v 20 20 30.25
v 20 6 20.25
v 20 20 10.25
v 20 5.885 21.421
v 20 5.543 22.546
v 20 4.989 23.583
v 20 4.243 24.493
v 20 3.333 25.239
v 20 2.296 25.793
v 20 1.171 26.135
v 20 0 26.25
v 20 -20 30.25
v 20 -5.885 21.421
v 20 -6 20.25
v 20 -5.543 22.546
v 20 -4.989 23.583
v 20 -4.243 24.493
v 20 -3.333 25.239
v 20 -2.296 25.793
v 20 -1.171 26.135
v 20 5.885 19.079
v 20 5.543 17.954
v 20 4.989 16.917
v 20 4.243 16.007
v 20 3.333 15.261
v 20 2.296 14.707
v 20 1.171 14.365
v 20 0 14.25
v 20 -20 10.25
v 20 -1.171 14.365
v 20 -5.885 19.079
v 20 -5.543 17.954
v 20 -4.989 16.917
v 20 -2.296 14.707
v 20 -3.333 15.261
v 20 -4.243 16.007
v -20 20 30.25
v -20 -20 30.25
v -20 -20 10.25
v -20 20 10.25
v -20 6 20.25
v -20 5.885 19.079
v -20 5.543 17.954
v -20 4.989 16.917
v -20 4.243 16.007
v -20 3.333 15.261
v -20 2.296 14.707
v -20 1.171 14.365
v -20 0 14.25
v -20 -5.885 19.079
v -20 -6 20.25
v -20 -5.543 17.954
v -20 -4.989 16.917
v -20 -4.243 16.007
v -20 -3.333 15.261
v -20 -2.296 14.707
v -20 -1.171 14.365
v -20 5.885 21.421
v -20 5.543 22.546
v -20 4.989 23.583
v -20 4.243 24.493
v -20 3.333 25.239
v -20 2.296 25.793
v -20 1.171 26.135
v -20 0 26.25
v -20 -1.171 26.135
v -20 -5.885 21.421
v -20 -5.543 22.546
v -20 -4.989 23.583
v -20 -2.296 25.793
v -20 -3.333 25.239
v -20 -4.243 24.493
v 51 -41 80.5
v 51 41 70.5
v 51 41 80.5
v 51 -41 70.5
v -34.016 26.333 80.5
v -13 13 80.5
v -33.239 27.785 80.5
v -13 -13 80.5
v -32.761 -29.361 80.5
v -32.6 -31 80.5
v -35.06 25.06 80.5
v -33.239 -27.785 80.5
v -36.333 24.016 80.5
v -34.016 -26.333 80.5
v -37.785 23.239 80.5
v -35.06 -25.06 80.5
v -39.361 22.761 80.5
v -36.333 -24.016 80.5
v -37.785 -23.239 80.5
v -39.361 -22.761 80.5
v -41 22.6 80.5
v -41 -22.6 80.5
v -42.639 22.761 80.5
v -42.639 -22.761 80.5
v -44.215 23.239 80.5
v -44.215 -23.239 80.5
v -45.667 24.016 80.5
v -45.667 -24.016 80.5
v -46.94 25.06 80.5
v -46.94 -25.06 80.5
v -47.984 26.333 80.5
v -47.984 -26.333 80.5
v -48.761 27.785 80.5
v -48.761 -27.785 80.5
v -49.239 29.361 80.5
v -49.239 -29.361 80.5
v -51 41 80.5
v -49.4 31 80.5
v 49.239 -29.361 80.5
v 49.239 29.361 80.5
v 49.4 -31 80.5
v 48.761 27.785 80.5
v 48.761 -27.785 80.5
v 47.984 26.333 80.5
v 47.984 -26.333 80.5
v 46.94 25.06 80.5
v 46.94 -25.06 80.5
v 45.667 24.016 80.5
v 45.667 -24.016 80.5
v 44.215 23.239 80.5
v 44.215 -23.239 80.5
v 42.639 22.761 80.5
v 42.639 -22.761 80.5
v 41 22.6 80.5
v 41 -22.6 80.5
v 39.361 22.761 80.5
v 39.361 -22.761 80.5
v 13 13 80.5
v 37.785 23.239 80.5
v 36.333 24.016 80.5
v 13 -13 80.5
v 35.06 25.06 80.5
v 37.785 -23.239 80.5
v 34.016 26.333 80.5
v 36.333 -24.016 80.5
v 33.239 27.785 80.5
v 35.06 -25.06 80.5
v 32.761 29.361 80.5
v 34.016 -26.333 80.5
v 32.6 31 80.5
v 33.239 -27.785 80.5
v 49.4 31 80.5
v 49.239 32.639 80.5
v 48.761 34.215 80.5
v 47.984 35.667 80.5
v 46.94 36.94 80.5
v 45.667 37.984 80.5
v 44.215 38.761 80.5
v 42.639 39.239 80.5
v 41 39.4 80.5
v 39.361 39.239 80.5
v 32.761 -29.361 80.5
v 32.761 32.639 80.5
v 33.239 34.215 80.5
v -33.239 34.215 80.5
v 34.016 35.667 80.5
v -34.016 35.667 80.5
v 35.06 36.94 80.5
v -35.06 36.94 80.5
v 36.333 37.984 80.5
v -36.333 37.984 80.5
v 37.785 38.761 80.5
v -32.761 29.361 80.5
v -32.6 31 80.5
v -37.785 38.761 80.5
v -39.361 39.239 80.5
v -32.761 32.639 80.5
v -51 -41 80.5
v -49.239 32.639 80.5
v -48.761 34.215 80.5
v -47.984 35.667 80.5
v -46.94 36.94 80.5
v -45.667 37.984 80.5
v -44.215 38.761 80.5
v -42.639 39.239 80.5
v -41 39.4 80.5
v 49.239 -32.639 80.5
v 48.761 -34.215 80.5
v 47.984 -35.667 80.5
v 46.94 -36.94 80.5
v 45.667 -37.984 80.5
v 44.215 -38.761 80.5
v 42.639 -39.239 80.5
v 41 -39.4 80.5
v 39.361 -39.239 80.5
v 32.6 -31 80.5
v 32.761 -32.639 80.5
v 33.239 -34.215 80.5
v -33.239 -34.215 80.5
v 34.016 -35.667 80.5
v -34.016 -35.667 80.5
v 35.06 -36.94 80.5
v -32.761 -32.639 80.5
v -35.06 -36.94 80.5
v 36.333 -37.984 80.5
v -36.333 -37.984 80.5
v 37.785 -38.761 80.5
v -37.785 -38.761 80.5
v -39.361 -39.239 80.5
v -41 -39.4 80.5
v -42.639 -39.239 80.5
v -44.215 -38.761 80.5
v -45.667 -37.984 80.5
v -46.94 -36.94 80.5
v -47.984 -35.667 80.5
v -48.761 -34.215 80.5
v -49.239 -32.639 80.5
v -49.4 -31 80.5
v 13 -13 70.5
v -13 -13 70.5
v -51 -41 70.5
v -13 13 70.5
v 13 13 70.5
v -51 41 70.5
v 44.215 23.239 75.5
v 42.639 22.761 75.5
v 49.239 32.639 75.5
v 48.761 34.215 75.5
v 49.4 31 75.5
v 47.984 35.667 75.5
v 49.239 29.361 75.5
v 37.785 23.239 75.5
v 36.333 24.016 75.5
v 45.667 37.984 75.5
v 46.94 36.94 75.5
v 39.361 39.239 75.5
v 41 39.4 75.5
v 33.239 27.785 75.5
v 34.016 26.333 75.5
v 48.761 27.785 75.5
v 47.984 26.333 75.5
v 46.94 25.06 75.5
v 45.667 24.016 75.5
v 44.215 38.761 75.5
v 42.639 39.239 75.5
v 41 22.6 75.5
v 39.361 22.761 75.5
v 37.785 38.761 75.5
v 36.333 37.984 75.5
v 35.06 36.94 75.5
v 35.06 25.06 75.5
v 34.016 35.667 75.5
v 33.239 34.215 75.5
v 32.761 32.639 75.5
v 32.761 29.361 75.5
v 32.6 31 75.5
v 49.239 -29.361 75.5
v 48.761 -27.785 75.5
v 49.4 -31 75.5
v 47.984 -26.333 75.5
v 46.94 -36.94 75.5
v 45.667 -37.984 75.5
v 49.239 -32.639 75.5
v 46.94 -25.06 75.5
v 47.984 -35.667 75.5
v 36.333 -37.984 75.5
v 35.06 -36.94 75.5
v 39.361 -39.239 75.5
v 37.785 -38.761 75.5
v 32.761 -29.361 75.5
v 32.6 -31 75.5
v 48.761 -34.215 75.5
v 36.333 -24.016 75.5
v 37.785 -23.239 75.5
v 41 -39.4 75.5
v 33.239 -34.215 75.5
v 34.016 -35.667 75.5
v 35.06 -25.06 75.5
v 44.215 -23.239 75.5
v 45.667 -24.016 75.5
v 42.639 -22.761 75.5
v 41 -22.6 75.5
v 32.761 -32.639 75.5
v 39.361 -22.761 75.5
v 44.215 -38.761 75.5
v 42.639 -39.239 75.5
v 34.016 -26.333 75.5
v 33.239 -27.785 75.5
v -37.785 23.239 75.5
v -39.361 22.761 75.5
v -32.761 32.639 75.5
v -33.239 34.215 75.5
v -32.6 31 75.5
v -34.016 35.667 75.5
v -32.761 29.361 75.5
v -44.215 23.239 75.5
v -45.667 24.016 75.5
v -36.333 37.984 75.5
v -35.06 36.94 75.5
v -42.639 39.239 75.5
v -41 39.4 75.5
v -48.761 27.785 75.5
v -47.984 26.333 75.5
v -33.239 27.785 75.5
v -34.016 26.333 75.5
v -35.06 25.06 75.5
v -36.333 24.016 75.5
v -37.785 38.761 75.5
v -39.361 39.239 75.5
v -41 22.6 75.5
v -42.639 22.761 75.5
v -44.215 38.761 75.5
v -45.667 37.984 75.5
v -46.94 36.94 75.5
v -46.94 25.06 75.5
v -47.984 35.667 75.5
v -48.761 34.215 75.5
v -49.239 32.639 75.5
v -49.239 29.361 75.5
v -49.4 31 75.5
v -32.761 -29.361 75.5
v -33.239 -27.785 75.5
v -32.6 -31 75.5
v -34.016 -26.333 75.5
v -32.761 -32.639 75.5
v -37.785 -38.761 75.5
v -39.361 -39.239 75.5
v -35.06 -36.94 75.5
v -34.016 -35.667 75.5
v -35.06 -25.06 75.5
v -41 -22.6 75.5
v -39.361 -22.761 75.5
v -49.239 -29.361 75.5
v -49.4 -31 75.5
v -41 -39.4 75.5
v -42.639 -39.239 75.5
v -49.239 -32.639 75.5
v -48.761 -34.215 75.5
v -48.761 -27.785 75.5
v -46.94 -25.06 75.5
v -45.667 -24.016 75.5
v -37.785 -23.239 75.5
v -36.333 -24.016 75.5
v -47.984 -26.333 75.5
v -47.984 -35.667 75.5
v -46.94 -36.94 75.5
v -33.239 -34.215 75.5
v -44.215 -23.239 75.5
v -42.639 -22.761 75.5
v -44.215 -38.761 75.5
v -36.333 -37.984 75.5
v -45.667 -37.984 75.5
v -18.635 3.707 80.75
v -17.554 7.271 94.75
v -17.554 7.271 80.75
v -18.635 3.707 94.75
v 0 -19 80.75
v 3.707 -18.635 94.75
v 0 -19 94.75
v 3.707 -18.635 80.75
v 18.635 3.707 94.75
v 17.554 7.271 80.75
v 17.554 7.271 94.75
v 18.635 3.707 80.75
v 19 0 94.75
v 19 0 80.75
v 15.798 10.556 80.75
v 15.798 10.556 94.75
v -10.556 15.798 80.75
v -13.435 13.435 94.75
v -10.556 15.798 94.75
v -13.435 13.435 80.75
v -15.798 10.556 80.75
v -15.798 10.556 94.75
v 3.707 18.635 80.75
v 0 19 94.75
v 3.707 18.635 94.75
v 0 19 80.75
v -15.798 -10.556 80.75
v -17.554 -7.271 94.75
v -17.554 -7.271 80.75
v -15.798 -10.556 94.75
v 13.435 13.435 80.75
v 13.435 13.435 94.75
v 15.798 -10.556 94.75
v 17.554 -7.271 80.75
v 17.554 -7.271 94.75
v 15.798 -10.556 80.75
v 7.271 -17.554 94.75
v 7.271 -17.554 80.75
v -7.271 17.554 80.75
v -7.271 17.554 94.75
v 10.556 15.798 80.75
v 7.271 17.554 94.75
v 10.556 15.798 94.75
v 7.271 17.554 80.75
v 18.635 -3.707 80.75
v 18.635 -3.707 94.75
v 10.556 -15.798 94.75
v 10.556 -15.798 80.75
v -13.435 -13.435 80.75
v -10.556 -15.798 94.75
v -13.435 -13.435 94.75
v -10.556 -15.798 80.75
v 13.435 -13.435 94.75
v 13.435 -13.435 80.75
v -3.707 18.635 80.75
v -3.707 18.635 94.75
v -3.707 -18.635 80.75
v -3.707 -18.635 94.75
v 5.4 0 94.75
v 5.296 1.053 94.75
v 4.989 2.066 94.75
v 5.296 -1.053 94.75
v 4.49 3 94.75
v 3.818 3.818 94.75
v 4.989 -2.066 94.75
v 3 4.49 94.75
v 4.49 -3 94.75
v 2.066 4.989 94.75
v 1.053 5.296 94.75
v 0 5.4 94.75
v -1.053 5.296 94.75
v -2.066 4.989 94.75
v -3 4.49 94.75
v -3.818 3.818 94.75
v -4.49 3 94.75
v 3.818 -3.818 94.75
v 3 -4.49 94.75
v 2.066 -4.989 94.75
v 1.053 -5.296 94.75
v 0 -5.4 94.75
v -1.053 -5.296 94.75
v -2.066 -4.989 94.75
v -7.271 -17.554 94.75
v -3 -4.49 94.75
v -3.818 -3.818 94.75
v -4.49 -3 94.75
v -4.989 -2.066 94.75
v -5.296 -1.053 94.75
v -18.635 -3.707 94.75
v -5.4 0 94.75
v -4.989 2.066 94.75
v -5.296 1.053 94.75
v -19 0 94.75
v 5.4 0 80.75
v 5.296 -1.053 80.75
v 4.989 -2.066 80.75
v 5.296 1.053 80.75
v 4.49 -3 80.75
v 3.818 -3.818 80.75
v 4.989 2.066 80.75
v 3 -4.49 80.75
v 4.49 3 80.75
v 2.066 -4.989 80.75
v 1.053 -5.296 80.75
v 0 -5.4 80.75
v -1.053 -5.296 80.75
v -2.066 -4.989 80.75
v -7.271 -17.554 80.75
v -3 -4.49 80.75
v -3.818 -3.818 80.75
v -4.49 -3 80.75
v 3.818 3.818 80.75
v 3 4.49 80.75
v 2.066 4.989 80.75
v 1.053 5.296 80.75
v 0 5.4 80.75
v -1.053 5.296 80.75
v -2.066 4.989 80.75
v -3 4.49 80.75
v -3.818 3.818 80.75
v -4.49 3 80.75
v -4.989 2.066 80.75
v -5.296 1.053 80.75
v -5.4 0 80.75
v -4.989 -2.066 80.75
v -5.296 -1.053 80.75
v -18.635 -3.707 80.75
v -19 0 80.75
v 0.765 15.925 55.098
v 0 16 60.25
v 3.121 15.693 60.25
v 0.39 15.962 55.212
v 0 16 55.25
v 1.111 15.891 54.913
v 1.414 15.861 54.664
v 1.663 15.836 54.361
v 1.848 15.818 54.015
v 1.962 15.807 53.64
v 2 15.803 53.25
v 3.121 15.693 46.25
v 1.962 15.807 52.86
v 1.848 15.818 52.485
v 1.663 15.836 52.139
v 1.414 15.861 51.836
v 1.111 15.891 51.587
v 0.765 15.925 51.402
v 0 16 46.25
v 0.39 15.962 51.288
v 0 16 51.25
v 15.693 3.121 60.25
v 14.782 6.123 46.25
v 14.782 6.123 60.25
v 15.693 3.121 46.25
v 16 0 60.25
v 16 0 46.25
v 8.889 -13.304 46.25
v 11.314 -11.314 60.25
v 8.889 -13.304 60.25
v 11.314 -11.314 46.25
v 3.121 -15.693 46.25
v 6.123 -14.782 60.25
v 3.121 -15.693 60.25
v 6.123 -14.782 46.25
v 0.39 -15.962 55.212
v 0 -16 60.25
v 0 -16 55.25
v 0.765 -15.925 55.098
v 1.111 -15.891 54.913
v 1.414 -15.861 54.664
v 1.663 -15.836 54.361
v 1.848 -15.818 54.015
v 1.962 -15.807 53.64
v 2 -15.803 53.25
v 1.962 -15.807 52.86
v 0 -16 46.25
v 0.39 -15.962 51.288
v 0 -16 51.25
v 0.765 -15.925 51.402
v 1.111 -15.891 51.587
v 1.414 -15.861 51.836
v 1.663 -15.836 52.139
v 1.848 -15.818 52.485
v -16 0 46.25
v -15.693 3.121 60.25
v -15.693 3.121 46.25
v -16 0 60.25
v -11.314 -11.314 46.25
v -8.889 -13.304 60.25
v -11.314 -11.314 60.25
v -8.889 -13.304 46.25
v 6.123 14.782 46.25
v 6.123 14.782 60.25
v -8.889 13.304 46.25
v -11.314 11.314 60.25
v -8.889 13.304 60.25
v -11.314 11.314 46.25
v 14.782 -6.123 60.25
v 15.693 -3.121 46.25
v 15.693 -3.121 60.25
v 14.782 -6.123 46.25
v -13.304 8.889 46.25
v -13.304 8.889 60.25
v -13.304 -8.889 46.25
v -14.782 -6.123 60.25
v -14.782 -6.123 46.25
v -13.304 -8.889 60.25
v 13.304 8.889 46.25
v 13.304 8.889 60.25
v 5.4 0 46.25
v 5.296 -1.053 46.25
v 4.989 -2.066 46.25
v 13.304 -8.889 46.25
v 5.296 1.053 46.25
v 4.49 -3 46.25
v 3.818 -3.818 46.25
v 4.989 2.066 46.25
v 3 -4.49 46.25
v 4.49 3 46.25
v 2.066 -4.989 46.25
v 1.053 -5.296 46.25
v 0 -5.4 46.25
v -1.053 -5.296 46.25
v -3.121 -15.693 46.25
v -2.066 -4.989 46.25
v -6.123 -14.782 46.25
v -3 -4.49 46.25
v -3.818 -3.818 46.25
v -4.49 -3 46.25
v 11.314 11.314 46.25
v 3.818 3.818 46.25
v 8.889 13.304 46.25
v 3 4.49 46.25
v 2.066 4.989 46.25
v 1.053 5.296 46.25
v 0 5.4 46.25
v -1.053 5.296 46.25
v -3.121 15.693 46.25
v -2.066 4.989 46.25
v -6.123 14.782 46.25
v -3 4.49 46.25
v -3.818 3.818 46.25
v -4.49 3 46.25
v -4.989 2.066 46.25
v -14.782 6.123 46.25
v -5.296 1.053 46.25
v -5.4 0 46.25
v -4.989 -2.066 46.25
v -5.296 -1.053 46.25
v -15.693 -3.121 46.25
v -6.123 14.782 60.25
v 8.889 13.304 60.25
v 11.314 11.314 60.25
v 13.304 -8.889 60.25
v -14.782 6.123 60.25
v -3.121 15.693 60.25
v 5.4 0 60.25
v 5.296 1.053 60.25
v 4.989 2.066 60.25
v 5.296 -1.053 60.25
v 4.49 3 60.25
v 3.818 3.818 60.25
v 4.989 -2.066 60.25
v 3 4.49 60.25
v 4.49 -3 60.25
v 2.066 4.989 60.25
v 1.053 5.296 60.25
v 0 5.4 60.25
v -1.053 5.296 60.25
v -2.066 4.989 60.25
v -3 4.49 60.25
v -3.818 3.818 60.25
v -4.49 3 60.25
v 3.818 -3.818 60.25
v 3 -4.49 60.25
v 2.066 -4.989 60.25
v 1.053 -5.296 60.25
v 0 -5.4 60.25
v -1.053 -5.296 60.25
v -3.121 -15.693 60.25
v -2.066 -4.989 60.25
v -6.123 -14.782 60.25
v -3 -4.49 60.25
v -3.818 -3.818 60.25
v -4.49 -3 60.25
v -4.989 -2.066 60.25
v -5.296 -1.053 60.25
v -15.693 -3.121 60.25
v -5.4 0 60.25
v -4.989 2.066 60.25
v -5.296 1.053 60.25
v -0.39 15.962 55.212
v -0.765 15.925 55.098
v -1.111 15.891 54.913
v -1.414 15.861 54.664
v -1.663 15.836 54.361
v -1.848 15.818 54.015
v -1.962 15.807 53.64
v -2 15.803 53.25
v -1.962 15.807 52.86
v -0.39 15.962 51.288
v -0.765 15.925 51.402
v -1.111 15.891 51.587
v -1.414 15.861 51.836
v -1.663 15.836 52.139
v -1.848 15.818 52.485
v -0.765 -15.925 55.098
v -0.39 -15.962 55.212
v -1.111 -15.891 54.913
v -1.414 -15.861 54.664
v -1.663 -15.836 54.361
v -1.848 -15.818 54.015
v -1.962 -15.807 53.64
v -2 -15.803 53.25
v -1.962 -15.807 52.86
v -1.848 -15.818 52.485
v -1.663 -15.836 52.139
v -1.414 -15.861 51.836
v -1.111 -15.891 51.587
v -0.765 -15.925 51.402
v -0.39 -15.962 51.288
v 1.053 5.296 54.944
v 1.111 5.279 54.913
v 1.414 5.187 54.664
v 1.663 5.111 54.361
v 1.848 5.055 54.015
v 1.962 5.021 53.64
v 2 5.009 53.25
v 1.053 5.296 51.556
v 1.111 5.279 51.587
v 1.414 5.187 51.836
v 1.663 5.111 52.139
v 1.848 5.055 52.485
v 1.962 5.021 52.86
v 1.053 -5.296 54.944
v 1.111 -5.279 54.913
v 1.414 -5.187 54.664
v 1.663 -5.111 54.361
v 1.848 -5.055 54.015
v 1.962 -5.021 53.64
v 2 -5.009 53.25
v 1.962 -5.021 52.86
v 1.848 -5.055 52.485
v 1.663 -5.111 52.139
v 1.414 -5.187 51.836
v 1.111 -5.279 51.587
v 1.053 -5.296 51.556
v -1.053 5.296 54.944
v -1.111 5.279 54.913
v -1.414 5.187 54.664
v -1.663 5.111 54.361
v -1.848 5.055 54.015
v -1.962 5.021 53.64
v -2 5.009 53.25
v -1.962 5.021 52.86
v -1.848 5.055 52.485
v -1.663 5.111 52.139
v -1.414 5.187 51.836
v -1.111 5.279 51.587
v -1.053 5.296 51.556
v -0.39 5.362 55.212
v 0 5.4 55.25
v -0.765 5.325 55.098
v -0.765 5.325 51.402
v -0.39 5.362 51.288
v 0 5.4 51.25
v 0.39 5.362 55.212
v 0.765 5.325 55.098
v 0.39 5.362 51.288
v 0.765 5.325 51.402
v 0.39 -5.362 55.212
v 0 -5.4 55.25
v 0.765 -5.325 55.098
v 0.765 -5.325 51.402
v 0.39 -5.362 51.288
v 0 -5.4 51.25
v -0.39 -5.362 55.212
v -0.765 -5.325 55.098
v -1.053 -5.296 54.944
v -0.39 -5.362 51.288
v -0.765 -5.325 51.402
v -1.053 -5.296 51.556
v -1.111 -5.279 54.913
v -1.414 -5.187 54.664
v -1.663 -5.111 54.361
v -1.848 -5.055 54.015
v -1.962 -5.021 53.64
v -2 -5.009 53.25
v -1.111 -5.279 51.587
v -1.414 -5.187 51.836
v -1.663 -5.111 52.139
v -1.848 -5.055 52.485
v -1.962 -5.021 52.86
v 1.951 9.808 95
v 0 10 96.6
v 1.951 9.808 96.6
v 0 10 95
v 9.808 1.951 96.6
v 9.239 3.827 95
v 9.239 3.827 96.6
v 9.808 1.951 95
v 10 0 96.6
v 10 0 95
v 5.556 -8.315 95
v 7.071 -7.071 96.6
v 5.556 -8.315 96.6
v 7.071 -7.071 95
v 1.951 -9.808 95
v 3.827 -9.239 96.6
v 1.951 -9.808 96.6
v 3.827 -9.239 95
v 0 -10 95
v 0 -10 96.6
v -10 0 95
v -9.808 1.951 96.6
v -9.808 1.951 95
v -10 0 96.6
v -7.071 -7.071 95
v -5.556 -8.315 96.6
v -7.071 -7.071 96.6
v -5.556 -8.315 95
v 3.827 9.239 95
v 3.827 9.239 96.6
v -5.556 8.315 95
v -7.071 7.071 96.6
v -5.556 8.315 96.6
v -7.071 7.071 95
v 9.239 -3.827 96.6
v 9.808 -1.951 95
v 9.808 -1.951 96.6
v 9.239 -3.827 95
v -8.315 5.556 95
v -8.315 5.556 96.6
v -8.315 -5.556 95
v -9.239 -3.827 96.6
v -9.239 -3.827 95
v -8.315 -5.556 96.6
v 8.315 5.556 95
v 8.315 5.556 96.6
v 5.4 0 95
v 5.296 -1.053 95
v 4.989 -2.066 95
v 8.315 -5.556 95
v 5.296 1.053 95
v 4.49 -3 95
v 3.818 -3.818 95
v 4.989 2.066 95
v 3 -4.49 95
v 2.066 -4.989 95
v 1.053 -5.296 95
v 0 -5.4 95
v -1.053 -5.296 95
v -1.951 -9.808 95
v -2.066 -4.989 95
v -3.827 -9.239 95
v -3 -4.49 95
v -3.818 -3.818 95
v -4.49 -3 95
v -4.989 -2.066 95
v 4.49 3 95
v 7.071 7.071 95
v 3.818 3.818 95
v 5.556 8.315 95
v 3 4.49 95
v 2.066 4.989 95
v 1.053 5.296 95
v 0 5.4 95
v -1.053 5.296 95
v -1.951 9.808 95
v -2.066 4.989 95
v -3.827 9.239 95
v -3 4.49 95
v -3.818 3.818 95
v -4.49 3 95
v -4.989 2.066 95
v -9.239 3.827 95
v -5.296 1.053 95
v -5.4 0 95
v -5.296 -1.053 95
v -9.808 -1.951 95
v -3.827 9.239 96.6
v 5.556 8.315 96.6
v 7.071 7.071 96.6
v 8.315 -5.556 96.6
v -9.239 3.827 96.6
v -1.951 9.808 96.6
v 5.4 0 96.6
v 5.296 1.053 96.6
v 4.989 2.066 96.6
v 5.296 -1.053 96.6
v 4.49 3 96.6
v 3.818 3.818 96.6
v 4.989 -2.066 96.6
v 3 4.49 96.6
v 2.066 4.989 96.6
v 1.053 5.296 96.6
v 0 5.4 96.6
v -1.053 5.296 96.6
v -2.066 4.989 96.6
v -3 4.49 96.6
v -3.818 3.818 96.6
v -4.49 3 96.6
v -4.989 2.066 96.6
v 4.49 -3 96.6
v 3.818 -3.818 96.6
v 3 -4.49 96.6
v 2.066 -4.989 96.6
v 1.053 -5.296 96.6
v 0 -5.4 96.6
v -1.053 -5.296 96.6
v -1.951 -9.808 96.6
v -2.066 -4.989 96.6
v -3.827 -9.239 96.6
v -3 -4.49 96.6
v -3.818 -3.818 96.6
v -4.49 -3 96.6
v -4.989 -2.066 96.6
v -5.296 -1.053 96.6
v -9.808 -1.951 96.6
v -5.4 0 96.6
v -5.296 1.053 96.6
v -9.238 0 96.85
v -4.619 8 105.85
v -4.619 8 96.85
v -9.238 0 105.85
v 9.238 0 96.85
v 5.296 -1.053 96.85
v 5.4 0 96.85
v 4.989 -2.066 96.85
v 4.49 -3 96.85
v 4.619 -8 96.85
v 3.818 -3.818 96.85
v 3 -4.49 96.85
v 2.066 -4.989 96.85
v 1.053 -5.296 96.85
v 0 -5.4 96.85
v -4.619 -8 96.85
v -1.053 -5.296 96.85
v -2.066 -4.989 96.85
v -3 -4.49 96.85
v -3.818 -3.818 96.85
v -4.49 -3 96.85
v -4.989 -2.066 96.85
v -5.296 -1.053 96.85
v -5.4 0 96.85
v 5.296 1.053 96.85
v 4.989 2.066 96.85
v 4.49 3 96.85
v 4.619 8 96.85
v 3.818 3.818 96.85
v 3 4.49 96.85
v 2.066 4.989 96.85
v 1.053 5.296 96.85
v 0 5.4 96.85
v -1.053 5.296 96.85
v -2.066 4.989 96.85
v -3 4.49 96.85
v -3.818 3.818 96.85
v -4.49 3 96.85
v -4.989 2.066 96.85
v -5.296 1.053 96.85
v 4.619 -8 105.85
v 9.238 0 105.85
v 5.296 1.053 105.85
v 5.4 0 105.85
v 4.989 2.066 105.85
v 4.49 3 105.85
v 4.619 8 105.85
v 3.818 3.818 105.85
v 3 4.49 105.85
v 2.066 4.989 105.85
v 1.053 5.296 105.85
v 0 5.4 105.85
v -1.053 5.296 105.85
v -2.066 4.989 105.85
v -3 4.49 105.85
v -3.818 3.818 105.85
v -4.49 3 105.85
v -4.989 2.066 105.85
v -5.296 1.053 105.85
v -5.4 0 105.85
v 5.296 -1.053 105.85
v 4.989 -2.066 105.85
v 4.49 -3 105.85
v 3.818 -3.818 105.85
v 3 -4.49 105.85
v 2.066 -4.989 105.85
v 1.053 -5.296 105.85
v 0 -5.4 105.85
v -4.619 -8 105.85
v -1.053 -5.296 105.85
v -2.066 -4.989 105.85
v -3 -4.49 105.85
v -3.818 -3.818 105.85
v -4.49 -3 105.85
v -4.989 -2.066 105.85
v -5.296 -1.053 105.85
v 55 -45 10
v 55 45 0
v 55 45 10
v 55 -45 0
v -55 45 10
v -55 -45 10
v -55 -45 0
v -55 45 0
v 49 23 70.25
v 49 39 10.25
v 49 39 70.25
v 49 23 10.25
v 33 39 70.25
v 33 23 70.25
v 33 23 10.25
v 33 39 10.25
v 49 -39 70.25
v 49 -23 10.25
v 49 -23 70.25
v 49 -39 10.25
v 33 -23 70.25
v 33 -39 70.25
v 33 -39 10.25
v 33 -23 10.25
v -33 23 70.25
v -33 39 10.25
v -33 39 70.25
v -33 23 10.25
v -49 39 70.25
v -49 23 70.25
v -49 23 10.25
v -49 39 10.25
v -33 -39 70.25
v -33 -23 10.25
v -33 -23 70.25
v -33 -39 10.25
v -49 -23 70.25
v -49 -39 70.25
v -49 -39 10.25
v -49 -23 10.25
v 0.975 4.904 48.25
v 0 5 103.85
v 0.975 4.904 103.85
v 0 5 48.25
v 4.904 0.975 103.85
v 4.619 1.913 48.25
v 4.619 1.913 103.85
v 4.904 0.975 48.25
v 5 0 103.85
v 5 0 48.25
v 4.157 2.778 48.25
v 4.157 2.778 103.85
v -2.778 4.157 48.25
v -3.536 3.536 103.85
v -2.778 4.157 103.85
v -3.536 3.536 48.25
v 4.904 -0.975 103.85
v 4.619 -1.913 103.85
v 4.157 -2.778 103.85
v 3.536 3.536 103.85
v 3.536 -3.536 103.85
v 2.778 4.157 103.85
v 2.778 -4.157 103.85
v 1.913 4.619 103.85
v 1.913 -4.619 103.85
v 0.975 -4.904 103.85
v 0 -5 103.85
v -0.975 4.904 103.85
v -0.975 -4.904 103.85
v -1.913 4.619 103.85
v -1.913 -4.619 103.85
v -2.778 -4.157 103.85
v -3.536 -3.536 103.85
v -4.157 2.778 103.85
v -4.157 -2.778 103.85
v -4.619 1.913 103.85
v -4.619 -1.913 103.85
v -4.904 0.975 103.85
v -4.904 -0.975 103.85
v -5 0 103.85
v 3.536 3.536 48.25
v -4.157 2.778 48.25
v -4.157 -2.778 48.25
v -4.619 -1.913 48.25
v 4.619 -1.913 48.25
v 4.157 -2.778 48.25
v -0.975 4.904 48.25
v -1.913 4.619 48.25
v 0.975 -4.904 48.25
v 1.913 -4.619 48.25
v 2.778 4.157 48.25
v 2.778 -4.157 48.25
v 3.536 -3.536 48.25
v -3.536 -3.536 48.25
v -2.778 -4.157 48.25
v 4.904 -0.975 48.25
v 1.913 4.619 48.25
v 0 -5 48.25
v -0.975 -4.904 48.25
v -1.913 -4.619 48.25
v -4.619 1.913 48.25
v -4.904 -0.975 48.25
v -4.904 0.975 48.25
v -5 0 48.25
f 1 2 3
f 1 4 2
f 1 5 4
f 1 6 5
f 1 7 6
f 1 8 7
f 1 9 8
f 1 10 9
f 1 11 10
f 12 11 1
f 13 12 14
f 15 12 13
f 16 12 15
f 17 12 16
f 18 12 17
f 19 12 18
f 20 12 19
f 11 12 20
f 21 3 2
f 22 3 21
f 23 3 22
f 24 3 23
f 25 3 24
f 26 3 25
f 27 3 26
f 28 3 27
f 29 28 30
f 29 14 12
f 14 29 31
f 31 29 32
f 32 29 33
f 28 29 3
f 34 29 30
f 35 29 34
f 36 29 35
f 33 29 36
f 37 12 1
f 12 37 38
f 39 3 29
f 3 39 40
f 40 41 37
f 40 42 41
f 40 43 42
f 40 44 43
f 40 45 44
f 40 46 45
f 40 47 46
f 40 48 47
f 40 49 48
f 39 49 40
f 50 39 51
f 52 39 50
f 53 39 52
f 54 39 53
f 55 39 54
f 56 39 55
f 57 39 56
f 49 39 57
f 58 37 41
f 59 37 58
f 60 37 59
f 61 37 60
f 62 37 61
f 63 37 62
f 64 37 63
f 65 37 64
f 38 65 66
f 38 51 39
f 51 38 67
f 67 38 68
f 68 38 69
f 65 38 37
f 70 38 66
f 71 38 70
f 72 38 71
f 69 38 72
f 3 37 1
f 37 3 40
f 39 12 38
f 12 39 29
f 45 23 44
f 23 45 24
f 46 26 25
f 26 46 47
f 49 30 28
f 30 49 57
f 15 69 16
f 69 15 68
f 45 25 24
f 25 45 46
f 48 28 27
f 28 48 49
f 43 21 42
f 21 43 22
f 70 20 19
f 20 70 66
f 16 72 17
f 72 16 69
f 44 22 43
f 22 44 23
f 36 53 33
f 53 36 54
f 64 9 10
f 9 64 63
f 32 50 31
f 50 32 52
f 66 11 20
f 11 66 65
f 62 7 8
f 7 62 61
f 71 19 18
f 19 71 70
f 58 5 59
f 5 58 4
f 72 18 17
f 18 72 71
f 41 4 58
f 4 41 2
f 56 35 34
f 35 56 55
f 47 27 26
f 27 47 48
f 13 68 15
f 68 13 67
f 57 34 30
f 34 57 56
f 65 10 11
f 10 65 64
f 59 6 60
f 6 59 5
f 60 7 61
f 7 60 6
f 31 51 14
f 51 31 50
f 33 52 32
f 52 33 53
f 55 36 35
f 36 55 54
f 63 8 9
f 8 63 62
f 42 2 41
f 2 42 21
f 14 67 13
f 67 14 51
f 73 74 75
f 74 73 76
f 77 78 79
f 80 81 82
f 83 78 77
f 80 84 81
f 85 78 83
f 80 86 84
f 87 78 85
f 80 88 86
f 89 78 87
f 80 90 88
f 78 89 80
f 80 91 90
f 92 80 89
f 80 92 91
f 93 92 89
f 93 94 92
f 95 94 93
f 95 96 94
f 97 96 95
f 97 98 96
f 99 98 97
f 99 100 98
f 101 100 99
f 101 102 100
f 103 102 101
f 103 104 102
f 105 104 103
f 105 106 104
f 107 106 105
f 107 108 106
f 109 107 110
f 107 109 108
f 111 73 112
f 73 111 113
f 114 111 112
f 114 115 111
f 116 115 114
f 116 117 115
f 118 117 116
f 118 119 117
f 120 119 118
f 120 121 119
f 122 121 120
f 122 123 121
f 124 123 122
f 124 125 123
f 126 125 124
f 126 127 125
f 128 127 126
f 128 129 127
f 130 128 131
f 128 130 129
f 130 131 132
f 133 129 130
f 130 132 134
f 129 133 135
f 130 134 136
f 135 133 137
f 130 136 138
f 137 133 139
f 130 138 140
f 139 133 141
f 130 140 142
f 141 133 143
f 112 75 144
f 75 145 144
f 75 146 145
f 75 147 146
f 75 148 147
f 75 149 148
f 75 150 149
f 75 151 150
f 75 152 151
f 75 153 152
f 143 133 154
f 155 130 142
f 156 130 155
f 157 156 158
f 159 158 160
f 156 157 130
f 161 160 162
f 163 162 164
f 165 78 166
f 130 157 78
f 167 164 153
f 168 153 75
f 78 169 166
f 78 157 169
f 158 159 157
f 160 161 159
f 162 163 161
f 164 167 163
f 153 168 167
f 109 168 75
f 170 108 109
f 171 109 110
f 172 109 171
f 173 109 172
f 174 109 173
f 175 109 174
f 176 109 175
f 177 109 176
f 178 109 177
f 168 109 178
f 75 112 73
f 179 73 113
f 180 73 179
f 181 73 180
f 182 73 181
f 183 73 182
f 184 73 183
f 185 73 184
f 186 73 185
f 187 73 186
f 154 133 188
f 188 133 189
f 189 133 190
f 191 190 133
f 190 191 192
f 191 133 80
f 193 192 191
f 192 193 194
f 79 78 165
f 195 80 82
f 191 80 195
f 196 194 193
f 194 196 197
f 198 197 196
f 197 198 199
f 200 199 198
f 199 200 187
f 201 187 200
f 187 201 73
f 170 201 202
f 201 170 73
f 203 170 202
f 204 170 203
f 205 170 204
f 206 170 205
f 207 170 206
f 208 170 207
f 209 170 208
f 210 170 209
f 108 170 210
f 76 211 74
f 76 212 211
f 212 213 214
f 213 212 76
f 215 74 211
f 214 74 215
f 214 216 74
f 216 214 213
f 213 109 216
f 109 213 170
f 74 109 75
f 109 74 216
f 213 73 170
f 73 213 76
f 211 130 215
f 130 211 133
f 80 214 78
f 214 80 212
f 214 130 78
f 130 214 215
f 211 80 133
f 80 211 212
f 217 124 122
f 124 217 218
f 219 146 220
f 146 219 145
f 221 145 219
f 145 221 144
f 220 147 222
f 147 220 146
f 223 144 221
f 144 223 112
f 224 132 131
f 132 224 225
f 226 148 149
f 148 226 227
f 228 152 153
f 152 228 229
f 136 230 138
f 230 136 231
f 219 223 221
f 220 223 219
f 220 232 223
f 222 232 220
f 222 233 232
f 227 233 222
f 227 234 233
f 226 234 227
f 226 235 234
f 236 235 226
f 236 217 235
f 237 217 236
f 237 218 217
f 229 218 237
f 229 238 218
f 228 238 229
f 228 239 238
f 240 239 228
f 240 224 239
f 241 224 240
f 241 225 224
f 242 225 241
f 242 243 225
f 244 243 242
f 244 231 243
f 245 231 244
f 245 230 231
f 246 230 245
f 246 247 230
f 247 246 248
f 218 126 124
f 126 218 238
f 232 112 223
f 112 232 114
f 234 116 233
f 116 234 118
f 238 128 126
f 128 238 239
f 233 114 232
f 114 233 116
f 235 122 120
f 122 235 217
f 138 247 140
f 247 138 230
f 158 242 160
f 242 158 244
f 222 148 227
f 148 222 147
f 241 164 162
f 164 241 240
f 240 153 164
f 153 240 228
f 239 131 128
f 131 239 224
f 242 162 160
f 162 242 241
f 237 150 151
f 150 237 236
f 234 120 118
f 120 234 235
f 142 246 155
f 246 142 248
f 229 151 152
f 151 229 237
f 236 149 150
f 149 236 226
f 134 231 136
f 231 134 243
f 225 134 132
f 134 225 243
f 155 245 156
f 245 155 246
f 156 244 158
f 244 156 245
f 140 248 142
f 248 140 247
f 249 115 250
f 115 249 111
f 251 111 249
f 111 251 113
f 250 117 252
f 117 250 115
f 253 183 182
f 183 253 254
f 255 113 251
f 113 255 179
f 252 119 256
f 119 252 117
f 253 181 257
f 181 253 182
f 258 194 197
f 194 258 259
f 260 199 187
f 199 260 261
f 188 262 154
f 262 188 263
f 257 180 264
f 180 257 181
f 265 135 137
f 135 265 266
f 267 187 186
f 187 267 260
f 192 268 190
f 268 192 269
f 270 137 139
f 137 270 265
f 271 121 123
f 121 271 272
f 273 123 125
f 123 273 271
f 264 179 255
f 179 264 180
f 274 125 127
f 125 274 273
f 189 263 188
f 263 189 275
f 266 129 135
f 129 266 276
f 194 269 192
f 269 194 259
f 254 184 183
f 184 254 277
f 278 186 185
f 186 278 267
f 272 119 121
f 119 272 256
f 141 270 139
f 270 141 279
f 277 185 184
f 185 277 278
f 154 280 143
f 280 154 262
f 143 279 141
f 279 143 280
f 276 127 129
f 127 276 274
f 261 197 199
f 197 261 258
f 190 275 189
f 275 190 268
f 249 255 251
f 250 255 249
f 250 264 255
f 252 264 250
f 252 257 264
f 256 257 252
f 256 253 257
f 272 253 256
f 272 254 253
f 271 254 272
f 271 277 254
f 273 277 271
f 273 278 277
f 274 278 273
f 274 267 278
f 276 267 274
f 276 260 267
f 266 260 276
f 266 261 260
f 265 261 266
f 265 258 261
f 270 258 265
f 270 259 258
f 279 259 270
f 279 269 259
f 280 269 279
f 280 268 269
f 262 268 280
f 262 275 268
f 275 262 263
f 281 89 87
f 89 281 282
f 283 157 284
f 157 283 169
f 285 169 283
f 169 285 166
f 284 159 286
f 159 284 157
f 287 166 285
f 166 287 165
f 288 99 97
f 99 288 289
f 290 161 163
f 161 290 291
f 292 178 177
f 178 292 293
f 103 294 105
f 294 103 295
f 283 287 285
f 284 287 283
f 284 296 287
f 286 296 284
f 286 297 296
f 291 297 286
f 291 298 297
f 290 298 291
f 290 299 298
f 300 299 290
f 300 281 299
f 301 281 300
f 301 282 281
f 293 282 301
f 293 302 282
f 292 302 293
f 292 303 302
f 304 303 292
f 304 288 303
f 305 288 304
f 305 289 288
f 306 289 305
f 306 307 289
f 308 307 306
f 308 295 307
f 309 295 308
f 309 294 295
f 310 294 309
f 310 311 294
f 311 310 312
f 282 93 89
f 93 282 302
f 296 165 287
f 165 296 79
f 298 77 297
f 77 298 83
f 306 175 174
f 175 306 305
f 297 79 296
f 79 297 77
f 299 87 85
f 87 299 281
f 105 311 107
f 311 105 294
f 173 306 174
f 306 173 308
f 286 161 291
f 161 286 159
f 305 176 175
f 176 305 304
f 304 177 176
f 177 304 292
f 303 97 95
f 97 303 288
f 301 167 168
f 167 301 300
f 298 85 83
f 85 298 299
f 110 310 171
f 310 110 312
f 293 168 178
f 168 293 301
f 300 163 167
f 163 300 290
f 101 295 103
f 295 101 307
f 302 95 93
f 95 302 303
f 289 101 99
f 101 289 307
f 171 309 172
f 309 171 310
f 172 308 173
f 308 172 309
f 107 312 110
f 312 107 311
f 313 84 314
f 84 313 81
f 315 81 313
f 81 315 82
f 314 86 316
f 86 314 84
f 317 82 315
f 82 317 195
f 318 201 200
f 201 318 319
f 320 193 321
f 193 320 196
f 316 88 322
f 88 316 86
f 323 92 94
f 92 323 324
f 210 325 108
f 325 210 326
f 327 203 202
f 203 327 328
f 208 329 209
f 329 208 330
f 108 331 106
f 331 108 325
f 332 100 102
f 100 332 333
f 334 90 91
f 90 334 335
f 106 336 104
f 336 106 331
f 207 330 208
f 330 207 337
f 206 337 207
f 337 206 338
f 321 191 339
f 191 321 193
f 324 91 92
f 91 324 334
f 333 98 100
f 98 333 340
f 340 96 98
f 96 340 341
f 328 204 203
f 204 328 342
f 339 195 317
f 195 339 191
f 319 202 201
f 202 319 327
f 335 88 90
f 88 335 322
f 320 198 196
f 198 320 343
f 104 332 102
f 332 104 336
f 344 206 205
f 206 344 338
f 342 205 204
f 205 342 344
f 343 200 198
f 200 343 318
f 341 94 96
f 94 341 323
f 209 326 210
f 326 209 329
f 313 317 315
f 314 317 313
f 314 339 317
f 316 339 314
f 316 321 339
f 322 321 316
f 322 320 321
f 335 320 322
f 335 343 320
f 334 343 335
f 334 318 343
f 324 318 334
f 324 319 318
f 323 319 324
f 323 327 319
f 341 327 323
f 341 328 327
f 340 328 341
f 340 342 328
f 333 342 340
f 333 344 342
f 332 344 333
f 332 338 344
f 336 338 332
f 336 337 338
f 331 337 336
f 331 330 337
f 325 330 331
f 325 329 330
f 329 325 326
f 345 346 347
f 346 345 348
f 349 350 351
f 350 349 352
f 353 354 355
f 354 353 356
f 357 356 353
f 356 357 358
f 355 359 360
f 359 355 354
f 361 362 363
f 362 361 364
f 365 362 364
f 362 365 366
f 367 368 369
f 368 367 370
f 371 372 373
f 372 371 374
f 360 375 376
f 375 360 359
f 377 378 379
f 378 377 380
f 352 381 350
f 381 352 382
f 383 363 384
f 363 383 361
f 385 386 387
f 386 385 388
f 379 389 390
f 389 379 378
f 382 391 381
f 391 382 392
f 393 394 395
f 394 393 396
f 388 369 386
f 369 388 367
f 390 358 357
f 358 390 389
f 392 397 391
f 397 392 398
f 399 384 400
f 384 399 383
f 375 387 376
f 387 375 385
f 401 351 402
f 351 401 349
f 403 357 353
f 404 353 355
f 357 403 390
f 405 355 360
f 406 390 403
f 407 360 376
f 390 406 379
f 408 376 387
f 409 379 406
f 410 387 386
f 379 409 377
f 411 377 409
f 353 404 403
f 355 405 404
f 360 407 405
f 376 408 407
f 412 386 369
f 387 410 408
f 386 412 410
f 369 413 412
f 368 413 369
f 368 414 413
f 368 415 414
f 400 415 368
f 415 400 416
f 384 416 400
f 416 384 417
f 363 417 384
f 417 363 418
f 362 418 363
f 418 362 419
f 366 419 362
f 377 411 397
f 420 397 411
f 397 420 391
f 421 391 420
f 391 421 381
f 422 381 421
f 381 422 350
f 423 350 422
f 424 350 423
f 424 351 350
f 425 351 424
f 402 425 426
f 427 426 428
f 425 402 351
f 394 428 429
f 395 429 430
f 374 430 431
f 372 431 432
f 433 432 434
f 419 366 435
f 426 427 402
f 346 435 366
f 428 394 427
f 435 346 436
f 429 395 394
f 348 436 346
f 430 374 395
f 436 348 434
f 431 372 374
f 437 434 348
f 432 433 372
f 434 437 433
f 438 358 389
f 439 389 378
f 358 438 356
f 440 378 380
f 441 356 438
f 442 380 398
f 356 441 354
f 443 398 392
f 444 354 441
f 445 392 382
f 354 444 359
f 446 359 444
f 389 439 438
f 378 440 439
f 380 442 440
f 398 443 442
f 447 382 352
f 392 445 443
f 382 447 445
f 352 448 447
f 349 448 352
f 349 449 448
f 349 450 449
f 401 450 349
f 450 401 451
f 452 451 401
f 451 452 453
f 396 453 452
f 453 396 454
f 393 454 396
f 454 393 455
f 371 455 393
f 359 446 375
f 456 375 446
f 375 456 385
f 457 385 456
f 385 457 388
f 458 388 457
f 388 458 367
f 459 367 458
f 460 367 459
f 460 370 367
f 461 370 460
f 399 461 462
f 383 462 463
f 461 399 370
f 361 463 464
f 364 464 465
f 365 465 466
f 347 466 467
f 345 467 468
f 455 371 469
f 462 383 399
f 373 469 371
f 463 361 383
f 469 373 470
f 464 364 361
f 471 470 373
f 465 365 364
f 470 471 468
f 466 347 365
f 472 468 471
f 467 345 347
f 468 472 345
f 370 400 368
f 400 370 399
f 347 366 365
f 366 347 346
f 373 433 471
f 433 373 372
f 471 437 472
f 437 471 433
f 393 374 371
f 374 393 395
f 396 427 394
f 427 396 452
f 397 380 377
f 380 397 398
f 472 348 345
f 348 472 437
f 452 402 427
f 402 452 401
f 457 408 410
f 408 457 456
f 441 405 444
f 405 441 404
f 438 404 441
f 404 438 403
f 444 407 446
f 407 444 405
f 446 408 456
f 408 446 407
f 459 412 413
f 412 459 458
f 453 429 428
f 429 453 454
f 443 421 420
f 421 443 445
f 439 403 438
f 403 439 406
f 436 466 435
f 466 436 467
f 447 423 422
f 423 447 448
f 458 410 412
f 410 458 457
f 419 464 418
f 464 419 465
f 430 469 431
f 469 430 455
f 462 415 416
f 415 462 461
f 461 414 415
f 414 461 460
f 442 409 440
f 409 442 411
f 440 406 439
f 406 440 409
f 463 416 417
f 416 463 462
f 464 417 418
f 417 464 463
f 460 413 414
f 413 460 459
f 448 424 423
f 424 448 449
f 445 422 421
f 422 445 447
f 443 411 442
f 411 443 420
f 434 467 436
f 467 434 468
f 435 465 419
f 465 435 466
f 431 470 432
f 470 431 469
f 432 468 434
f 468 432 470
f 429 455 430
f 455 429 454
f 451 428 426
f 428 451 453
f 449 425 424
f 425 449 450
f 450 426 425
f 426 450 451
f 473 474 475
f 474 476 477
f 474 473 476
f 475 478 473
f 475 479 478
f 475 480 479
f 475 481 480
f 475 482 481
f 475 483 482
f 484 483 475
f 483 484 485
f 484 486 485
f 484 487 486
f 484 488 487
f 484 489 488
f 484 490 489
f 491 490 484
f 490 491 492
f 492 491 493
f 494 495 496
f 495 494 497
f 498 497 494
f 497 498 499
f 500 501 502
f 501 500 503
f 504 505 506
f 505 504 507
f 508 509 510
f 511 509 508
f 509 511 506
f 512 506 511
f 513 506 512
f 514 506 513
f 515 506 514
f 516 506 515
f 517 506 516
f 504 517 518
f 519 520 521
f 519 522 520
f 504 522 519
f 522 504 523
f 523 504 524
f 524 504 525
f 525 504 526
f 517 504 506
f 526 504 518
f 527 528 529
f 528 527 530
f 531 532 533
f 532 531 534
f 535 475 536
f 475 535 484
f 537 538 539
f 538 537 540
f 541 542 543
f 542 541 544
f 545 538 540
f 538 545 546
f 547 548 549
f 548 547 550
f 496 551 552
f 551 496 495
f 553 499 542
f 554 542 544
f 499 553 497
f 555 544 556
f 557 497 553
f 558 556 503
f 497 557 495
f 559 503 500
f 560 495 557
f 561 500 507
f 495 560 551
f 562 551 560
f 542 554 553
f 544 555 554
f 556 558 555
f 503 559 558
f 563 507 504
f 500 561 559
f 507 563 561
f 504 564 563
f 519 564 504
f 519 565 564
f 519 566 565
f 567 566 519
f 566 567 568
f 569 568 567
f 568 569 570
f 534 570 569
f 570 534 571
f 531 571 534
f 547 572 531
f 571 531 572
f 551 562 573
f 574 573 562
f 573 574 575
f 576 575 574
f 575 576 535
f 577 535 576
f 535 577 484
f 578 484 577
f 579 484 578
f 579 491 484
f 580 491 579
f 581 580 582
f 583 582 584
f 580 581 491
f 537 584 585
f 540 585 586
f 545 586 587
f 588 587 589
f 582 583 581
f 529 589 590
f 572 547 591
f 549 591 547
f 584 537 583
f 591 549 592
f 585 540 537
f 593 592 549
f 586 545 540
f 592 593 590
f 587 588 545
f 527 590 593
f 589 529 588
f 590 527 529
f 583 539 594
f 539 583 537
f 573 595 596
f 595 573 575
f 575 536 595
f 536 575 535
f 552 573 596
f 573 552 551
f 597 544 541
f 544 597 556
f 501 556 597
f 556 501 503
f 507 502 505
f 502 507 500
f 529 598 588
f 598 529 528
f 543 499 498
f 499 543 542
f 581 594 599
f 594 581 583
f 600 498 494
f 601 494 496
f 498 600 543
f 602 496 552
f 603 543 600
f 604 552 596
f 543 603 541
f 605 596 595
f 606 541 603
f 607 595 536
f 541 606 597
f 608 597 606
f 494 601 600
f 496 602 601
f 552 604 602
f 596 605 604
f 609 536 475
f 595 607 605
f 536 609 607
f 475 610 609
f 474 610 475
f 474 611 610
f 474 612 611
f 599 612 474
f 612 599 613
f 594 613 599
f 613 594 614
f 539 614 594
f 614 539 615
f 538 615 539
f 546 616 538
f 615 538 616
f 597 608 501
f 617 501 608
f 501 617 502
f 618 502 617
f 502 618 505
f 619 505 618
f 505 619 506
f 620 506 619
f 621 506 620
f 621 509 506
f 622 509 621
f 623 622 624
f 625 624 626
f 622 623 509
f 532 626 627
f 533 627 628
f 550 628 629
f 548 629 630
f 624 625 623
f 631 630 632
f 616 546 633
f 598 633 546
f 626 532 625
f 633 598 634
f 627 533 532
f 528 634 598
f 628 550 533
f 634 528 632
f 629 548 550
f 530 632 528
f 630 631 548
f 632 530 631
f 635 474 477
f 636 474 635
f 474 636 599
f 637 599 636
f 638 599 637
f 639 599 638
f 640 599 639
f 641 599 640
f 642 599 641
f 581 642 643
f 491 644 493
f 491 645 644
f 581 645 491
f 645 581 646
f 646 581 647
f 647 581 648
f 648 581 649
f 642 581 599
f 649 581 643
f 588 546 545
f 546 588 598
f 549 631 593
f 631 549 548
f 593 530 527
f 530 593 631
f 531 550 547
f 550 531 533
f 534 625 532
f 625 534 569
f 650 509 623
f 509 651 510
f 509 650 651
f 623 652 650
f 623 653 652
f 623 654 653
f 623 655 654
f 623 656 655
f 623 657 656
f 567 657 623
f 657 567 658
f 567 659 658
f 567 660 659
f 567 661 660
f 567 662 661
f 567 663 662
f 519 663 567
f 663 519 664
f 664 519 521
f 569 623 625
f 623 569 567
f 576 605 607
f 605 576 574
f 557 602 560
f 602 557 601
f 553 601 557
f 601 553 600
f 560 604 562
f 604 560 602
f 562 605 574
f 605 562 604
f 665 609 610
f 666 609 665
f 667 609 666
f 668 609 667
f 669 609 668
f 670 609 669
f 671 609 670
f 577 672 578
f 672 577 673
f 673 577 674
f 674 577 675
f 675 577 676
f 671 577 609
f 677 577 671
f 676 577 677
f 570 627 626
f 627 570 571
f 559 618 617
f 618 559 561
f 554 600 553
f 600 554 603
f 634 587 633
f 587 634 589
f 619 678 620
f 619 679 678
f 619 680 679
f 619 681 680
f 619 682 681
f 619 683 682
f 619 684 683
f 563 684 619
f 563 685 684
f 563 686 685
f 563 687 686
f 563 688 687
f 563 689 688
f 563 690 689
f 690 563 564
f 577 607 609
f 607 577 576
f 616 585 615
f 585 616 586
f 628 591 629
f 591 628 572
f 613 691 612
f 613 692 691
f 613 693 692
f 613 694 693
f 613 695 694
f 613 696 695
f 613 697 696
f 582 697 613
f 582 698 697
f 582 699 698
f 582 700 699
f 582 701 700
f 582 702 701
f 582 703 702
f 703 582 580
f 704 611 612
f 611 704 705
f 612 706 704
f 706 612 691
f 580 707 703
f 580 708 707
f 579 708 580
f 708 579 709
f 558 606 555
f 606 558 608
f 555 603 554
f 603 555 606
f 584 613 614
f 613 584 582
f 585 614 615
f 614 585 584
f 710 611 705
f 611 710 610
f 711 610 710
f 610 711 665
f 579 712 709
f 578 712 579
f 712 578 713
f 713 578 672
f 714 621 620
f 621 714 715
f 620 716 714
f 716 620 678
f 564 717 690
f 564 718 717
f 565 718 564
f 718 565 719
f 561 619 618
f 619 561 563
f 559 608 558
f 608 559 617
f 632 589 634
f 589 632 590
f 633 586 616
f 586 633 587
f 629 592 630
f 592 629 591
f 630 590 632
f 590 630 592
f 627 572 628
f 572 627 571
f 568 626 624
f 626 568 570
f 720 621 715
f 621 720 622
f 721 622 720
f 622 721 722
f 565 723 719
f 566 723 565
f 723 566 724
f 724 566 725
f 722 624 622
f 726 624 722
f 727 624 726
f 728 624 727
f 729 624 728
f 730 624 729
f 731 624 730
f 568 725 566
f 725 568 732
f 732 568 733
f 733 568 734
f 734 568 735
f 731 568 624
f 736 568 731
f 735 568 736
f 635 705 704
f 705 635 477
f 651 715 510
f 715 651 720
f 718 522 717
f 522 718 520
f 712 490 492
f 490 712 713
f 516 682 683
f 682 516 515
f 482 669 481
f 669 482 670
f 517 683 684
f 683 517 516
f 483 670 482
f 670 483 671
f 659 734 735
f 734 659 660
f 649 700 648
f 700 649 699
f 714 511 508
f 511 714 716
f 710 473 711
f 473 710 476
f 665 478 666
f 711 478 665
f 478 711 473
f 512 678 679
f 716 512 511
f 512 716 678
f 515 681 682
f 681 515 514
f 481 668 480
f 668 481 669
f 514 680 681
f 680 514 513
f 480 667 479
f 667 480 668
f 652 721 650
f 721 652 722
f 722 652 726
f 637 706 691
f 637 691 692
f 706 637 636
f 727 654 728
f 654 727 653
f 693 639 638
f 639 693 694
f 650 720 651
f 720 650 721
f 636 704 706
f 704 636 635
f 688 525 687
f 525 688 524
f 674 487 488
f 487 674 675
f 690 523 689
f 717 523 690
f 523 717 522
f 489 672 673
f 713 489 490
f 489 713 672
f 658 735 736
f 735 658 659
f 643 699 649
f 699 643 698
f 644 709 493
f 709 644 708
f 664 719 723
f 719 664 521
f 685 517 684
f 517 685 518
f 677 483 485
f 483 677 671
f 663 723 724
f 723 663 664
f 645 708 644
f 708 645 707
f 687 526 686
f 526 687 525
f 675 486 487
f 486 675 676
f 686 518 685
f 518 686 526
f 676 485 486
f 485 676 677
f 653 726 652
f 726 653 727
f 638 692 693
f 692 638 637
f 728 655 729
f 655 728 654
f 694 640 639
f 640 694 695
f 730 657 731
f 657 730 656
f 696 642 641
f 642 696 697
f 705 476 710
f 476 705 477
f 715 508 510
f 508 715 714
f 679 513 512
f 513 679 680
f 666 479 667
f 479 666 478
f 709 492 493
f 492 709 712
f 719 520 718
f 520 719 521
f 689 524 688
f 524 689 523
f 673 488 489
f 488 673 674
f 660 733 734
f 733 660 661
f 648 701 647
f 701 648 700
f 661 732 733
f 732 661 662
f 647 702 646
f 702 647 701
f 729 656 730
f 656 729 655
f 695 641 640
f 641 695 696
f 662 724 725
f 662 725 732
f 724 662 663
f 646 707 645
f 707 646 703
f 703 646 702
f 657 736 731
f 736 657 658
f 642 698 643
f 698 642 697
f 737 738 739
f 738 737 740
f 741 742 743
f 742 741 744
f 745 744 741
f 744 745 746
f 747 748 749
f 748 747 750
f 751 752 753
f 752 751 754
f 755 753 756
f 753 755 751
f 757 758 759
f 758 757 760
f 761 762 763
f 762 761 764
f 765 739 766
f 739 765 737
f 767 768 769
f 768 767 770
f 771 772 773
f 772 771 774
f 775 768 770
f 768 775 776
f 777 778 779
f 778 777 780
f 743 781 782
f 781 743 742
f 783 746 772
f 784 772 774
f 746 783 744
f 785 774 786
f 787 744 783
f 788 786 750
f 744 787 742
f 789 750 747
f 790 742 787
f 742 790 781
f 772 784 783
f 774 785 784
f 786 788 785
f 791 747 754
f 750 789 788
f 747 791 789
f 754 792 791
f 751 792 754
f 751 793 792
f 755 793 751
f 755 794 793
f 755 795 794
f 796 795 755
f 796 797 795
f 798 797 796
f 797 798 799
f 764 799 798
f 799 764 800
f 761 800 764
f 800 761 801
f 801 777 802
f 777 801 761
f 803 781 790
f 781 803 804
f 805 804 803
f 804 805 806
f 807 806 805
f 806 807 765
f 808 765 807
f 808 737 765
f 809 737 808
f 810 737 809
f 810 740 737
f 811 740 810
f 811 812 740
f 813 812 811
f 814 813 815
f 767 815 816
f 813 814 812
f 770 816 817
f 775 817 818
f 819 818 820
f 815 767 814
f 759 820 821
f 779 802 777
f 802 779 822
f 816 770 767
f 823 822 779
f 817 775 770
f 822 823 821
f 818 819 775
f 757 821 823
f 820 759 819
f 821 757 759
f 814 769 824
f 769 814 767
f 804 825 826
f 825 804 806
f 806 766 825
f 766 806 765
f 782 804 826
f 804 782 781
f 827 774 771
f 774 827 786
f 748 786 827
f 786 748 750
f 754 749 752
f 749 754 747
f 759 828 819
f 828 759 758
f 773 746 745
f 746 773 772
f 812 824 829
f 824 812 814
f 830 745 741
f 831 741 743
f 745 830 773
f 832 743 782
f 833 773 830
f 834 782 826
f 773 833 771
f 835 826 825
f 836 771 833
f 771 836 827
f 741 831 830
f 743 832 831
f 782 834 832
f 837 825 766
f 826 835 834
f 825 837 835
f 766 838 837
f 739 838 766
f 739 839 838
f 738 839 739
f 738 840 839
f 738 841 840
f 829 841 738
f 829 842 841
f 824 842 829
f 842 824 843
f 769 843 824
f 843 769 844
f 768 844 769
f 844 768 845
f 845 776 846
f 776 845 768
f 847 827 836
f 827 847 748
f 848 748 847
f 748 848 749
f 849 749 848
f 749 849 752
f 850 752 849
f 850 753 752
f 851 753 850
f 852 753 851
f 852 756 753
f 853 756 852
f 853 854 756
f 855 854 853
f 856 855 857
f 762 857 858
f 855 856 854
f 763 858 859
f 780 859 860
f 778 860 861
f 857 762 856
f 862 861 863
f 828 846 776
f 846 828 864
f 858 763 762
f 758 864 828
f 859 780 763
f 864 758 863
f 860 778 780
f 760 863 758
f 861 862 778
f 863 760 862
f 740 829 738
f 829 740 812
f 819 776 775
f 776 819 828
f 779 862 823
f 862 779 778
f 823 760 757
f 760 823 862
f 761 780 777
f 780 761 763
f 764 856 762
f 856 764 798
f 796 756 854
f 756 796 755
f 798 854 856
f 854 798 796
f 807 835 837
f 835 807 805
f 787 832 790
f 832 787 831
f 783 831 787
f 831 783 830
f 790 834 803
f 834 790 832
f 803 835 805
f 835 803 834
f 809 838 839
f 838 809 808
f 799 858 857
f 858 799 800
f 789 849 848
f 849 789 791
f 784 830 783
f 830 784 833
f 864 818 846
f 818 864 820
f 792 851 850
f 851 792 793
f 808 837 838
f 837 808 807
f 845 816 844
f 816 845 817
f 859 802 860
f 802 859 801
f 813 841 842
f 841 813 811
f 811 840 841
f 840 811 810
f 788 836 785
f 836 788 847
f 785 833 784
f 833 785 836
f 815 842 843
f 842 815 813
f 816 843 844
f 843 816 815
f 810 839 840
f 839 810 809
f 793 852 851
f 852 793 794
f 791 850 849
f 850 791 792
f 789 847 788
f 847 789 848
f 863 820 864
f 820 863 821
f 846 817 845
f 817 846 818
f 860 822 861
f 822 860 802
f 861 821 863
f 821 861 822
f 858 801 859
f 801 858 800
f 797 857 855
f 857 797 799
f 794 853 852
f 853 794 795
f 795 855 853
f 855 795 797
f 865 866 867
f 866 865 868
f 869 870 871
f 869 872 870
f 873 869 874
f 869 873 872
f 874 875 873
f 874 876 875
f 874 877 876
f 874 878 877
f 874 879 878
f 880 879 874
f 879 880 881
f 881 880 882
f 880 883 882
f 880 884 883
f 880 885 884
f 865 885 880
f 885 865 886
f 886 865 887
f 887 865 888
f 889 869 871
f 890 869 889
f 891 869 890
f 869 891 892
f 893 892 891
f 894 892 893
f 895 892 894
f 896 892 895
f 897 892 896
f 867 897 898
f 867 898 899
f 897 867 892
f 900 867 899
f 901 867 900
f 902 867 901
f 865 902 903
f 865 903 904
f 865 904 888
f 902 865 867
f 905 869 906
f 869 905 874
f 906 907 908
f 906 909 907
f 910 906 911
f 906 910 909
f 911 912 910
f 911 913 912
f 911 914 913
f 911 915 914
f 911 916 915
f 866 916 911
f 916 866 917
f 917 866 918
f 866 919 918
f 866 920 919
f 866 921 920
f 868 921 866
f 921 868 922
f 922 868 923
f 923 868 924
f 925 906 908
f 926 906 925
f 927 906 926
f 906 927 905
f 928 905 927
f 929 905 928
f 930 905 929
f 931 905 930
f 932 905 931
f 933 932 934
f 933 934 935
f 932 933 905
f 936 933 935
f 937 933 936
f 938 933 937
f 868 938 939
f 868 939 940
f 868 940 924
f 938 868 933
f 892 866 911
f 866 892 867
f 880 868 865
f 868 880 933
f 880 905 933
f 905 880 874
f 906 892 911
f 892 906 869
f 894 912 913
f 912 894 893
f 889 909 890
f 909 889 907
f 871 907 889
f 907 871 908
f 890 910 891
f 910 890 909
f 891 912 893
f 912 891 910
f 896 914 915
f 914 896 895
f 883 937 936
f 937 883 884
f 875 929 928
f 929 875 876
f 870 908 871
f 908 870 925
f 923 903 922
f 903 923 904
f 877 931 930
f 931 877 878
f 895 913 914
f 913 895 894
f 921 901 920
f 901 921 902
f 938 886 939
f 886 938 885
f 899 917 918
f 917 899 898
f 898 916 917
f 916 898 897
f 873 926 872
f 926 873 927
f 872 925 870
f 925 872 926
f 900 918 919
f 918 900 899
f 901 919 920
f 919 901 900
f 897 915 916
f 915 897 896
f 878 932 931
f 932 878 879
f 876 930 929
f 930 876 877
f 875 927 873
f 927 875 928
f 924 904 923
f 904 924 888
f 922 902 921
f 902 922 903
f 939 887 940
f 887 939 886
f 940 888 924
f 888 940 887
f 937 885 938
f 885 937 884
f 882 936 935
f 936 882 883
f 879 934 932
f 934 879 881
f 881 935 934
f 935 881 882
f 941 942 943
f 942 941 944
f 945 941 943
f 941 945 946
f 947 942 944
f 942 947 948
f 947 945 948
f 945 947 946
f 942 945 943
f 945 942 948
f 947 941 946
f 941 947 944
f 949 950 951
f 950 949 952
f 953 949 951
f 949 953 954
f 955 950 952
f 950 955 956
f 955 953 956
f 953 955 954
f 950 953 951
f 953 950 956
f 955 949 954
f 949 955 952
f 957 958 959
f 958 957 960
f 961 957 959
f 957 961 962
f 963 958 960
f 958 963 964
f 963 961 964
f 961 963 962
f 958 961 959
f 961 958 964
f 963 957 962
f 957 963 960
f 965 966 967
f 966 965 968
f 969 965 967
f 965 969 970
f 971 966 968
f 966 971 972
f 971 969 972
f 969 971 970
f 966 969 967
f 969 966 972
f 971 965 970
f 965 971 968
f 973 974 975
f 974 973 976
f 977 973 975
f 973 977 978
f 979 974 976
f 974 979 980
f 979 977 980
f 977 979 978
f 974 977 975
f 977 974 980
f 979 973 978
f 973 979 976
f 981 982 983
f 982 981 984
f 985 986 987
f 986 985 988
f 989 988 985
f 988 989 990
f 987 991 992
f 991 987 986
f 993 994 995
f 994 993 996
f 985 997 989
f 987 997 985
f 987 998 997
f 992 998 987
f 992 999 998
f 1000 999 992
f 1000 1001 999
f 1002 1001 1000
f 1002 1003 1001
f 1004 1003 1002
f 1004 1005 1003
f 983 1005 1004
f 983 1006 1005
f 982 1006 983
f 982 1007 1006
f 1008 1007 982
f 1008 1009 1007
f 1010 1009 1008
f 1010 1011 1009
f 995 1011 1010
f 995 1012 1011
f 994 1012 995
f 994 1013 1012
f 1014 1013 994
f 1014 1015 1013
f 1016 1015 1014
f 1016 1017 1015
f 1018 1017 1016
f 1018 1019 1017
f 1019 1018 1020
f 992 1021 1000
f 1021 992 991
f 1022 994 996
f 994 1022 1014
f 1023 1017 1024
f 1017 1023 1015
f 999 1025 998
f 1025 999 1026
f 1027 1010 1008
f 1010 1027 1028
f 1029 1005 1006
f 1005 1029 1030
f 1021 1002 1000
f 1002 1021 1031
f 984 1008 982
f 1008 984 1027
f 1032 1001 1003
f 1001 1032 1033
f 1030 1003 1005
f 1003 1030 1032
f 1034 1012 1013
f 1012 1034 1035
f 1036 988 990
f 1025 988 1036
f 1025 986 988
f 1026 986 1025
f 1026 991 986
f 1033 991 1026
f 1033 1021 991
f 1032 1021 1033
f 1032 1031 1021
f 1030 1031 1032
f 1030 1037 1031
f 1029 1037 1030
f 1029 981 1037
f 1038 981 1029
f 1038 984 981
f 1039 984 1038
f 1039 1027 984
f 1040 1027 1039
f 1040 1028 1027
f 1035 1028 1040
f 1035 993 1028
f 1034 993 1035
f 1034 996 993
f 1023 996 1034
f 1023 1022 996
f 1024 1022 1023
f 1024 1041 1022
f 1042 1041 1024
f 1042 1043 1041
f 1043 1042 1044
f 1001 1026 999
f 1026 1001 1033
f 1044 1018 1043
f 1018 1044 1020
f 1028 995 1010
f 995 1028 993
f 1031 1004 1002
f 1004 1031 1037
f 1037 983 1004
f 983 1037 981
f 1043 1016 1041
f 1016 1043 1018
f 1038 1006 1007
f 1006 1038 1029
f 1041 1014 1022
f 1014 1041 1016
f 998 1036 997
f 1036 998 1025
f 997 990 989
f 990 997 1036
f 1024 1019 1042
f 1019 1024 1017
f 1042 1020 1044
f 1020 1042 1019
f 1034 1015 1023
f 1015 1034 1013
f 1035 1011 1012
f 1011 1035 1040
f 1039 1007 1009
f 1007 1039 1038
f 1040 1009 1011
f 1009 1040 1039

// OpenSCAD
$fn = 32;

// ------------------------------------------------------------------------
// Arbor press fixture: screw d10, posts 60 mm, gap 16 mm
// Every part is its own module, assembly() places every instance.
// ------------------------------------------------------------------------

// --- part 1 ---
module press_bed() {
  difference() {
    translate([-55, -45, 0]) cube([110, 90, 10]);
  }
}

// --- part 2 ---
module anvil_block() {
  difference() {
    translate([-20, -20, 0]) cube([40, 40, 20]);
    translate([0, 0, 10]) rotate([0, 90, 0]) cylinder(h = 42, d = 12, center = true);
  }
}

// --- part 3 ---
module press_post_a() {
  translate([-8, -8, 0]) cube([16, 16, 60]);
}

// --- part 4 ---
module press_post_b() {
  translate([-8, -8, 0]) cube([16, 16, 60]);
}

// --- part 5 ---
module press_post_c() {
  translate([-8, -8, 0]) cube([16, 16, 60]);
}

// --- part 6 ---
module press_post_d() {
  translate([-8, -8, 0]) cube([16, 16, 60]);
}

// --- part 7 ---
module press_frame() {
  difference() {
    translate([-51, -41, 0]) cube([102, 82, 10]);
    translate([-13, -13, -1]) cube([26, 26, 12]);
    translate([41, 31, 5]) cylinder(h = 6, d = 16.8);
    translate([41, -31, 5]) cylinder(h = 6, d = 16.8);
    translate([-41, 31, 5]) cylinder(h = 6, d = 16.8);
    translate([-41, -31, 5]) cylinder(h = 6, d = 16.8);
  }
}

// --- part 8 ---
module guide_ring() {
  difference() {
      translate([0, 0, 0]) cylinder(h = 14, d = 38);
      translate([0, 0, -1]) cylinder(h = 16, d = 10.8);
    }
}

// --- part 9 ---
module press_screw() {
  translate([0, 0, -27.8]) cylinder(h = 55.6, d = 10);
}

// --- part 10 ---
module press_head() {
  difference() {
    cylinder(h = 14, d = 32);
    translate([0, 0, -1]) cylinder(h = 16, d = 10.8);
    translate([0, 0, 7]) rotate([90, 0, 0]) cylinder(h = 34, d = 4, center = true);
  }
}

// --- part 11 ---
module nut_washer() {
  difference() {
      translate([0, 0, 0]) cylinder(h = 1.6, d = 20);
      translate([0, 0, -1]) cylinder(h = 3.6, d = 10.8);
    }
}

// --- part 12 ---
module press_nut() {
  difference() {
    linear_extrude(height = 9) polygon(points = [[9.238, 0], [4.619, 8], [-4.619, 8], [-9.238, 0], [-4.619, -8], [4.619, -8]]);
    translate([0, 0, -1]) cylinder(h = 11, d = 10.8);
  }
}

// --- assembly ---
module assembly() {
  color([0.80, 0.24, 0.20]) translate([0, 0, 0]) rotate([0, 0, 0]) press_bed();
  color([0.20, 0.45, 0.75]) translate([0, 0, 10.25]) rotate([0, 0, 0]) anvil_block();
  color([0.25, 0.62, 0.32]) translate([41, 31, 10.25]) rotate([0, 0, 0]) press_post_a();
  color([0.92, 0.70, 0.18]) translate([41, -31, 10.25]) rotate([0, 0, 0]) press_post_b();
  color([0.58, 0.35, 0.70]) translate([-41, 31, 10.25]) rotate([0, 0, 0]) press_post_c();
  color([0.16, 0.66, 0.66]) translate([-41, -31, 10.25]) rotate([0, 0, 0]) press_post_d();
  color([0.85, 0.48, 0.18]) translate([0, 0, 70.5]) rotate([0, 0, 0]) press_frame();
  color([0.55, 0.60, 0.65]) translate([0, 0, 80.75]) rotate([0, 0, 0]) guide_ring();
  color([0.75, 0.30, 0.55]) translate([0, 0, 76.05]) rotate([0, 0, 0]) press_screw();
  color([0.42, 0.52, 0.28]) translate([0, 0, 46.25]) rotate([0, 0, 0]) press_head();
  color([0.80, 0.24, 0.20]) translate([0, 0, 95]) rotate([0, 0, 0]) nut_washer();
  color([0.20, 0.45, 0.75]) translate([0, 0, 96.85]) rotate([0, 0, 0]) press_nut();
}

assembly();
